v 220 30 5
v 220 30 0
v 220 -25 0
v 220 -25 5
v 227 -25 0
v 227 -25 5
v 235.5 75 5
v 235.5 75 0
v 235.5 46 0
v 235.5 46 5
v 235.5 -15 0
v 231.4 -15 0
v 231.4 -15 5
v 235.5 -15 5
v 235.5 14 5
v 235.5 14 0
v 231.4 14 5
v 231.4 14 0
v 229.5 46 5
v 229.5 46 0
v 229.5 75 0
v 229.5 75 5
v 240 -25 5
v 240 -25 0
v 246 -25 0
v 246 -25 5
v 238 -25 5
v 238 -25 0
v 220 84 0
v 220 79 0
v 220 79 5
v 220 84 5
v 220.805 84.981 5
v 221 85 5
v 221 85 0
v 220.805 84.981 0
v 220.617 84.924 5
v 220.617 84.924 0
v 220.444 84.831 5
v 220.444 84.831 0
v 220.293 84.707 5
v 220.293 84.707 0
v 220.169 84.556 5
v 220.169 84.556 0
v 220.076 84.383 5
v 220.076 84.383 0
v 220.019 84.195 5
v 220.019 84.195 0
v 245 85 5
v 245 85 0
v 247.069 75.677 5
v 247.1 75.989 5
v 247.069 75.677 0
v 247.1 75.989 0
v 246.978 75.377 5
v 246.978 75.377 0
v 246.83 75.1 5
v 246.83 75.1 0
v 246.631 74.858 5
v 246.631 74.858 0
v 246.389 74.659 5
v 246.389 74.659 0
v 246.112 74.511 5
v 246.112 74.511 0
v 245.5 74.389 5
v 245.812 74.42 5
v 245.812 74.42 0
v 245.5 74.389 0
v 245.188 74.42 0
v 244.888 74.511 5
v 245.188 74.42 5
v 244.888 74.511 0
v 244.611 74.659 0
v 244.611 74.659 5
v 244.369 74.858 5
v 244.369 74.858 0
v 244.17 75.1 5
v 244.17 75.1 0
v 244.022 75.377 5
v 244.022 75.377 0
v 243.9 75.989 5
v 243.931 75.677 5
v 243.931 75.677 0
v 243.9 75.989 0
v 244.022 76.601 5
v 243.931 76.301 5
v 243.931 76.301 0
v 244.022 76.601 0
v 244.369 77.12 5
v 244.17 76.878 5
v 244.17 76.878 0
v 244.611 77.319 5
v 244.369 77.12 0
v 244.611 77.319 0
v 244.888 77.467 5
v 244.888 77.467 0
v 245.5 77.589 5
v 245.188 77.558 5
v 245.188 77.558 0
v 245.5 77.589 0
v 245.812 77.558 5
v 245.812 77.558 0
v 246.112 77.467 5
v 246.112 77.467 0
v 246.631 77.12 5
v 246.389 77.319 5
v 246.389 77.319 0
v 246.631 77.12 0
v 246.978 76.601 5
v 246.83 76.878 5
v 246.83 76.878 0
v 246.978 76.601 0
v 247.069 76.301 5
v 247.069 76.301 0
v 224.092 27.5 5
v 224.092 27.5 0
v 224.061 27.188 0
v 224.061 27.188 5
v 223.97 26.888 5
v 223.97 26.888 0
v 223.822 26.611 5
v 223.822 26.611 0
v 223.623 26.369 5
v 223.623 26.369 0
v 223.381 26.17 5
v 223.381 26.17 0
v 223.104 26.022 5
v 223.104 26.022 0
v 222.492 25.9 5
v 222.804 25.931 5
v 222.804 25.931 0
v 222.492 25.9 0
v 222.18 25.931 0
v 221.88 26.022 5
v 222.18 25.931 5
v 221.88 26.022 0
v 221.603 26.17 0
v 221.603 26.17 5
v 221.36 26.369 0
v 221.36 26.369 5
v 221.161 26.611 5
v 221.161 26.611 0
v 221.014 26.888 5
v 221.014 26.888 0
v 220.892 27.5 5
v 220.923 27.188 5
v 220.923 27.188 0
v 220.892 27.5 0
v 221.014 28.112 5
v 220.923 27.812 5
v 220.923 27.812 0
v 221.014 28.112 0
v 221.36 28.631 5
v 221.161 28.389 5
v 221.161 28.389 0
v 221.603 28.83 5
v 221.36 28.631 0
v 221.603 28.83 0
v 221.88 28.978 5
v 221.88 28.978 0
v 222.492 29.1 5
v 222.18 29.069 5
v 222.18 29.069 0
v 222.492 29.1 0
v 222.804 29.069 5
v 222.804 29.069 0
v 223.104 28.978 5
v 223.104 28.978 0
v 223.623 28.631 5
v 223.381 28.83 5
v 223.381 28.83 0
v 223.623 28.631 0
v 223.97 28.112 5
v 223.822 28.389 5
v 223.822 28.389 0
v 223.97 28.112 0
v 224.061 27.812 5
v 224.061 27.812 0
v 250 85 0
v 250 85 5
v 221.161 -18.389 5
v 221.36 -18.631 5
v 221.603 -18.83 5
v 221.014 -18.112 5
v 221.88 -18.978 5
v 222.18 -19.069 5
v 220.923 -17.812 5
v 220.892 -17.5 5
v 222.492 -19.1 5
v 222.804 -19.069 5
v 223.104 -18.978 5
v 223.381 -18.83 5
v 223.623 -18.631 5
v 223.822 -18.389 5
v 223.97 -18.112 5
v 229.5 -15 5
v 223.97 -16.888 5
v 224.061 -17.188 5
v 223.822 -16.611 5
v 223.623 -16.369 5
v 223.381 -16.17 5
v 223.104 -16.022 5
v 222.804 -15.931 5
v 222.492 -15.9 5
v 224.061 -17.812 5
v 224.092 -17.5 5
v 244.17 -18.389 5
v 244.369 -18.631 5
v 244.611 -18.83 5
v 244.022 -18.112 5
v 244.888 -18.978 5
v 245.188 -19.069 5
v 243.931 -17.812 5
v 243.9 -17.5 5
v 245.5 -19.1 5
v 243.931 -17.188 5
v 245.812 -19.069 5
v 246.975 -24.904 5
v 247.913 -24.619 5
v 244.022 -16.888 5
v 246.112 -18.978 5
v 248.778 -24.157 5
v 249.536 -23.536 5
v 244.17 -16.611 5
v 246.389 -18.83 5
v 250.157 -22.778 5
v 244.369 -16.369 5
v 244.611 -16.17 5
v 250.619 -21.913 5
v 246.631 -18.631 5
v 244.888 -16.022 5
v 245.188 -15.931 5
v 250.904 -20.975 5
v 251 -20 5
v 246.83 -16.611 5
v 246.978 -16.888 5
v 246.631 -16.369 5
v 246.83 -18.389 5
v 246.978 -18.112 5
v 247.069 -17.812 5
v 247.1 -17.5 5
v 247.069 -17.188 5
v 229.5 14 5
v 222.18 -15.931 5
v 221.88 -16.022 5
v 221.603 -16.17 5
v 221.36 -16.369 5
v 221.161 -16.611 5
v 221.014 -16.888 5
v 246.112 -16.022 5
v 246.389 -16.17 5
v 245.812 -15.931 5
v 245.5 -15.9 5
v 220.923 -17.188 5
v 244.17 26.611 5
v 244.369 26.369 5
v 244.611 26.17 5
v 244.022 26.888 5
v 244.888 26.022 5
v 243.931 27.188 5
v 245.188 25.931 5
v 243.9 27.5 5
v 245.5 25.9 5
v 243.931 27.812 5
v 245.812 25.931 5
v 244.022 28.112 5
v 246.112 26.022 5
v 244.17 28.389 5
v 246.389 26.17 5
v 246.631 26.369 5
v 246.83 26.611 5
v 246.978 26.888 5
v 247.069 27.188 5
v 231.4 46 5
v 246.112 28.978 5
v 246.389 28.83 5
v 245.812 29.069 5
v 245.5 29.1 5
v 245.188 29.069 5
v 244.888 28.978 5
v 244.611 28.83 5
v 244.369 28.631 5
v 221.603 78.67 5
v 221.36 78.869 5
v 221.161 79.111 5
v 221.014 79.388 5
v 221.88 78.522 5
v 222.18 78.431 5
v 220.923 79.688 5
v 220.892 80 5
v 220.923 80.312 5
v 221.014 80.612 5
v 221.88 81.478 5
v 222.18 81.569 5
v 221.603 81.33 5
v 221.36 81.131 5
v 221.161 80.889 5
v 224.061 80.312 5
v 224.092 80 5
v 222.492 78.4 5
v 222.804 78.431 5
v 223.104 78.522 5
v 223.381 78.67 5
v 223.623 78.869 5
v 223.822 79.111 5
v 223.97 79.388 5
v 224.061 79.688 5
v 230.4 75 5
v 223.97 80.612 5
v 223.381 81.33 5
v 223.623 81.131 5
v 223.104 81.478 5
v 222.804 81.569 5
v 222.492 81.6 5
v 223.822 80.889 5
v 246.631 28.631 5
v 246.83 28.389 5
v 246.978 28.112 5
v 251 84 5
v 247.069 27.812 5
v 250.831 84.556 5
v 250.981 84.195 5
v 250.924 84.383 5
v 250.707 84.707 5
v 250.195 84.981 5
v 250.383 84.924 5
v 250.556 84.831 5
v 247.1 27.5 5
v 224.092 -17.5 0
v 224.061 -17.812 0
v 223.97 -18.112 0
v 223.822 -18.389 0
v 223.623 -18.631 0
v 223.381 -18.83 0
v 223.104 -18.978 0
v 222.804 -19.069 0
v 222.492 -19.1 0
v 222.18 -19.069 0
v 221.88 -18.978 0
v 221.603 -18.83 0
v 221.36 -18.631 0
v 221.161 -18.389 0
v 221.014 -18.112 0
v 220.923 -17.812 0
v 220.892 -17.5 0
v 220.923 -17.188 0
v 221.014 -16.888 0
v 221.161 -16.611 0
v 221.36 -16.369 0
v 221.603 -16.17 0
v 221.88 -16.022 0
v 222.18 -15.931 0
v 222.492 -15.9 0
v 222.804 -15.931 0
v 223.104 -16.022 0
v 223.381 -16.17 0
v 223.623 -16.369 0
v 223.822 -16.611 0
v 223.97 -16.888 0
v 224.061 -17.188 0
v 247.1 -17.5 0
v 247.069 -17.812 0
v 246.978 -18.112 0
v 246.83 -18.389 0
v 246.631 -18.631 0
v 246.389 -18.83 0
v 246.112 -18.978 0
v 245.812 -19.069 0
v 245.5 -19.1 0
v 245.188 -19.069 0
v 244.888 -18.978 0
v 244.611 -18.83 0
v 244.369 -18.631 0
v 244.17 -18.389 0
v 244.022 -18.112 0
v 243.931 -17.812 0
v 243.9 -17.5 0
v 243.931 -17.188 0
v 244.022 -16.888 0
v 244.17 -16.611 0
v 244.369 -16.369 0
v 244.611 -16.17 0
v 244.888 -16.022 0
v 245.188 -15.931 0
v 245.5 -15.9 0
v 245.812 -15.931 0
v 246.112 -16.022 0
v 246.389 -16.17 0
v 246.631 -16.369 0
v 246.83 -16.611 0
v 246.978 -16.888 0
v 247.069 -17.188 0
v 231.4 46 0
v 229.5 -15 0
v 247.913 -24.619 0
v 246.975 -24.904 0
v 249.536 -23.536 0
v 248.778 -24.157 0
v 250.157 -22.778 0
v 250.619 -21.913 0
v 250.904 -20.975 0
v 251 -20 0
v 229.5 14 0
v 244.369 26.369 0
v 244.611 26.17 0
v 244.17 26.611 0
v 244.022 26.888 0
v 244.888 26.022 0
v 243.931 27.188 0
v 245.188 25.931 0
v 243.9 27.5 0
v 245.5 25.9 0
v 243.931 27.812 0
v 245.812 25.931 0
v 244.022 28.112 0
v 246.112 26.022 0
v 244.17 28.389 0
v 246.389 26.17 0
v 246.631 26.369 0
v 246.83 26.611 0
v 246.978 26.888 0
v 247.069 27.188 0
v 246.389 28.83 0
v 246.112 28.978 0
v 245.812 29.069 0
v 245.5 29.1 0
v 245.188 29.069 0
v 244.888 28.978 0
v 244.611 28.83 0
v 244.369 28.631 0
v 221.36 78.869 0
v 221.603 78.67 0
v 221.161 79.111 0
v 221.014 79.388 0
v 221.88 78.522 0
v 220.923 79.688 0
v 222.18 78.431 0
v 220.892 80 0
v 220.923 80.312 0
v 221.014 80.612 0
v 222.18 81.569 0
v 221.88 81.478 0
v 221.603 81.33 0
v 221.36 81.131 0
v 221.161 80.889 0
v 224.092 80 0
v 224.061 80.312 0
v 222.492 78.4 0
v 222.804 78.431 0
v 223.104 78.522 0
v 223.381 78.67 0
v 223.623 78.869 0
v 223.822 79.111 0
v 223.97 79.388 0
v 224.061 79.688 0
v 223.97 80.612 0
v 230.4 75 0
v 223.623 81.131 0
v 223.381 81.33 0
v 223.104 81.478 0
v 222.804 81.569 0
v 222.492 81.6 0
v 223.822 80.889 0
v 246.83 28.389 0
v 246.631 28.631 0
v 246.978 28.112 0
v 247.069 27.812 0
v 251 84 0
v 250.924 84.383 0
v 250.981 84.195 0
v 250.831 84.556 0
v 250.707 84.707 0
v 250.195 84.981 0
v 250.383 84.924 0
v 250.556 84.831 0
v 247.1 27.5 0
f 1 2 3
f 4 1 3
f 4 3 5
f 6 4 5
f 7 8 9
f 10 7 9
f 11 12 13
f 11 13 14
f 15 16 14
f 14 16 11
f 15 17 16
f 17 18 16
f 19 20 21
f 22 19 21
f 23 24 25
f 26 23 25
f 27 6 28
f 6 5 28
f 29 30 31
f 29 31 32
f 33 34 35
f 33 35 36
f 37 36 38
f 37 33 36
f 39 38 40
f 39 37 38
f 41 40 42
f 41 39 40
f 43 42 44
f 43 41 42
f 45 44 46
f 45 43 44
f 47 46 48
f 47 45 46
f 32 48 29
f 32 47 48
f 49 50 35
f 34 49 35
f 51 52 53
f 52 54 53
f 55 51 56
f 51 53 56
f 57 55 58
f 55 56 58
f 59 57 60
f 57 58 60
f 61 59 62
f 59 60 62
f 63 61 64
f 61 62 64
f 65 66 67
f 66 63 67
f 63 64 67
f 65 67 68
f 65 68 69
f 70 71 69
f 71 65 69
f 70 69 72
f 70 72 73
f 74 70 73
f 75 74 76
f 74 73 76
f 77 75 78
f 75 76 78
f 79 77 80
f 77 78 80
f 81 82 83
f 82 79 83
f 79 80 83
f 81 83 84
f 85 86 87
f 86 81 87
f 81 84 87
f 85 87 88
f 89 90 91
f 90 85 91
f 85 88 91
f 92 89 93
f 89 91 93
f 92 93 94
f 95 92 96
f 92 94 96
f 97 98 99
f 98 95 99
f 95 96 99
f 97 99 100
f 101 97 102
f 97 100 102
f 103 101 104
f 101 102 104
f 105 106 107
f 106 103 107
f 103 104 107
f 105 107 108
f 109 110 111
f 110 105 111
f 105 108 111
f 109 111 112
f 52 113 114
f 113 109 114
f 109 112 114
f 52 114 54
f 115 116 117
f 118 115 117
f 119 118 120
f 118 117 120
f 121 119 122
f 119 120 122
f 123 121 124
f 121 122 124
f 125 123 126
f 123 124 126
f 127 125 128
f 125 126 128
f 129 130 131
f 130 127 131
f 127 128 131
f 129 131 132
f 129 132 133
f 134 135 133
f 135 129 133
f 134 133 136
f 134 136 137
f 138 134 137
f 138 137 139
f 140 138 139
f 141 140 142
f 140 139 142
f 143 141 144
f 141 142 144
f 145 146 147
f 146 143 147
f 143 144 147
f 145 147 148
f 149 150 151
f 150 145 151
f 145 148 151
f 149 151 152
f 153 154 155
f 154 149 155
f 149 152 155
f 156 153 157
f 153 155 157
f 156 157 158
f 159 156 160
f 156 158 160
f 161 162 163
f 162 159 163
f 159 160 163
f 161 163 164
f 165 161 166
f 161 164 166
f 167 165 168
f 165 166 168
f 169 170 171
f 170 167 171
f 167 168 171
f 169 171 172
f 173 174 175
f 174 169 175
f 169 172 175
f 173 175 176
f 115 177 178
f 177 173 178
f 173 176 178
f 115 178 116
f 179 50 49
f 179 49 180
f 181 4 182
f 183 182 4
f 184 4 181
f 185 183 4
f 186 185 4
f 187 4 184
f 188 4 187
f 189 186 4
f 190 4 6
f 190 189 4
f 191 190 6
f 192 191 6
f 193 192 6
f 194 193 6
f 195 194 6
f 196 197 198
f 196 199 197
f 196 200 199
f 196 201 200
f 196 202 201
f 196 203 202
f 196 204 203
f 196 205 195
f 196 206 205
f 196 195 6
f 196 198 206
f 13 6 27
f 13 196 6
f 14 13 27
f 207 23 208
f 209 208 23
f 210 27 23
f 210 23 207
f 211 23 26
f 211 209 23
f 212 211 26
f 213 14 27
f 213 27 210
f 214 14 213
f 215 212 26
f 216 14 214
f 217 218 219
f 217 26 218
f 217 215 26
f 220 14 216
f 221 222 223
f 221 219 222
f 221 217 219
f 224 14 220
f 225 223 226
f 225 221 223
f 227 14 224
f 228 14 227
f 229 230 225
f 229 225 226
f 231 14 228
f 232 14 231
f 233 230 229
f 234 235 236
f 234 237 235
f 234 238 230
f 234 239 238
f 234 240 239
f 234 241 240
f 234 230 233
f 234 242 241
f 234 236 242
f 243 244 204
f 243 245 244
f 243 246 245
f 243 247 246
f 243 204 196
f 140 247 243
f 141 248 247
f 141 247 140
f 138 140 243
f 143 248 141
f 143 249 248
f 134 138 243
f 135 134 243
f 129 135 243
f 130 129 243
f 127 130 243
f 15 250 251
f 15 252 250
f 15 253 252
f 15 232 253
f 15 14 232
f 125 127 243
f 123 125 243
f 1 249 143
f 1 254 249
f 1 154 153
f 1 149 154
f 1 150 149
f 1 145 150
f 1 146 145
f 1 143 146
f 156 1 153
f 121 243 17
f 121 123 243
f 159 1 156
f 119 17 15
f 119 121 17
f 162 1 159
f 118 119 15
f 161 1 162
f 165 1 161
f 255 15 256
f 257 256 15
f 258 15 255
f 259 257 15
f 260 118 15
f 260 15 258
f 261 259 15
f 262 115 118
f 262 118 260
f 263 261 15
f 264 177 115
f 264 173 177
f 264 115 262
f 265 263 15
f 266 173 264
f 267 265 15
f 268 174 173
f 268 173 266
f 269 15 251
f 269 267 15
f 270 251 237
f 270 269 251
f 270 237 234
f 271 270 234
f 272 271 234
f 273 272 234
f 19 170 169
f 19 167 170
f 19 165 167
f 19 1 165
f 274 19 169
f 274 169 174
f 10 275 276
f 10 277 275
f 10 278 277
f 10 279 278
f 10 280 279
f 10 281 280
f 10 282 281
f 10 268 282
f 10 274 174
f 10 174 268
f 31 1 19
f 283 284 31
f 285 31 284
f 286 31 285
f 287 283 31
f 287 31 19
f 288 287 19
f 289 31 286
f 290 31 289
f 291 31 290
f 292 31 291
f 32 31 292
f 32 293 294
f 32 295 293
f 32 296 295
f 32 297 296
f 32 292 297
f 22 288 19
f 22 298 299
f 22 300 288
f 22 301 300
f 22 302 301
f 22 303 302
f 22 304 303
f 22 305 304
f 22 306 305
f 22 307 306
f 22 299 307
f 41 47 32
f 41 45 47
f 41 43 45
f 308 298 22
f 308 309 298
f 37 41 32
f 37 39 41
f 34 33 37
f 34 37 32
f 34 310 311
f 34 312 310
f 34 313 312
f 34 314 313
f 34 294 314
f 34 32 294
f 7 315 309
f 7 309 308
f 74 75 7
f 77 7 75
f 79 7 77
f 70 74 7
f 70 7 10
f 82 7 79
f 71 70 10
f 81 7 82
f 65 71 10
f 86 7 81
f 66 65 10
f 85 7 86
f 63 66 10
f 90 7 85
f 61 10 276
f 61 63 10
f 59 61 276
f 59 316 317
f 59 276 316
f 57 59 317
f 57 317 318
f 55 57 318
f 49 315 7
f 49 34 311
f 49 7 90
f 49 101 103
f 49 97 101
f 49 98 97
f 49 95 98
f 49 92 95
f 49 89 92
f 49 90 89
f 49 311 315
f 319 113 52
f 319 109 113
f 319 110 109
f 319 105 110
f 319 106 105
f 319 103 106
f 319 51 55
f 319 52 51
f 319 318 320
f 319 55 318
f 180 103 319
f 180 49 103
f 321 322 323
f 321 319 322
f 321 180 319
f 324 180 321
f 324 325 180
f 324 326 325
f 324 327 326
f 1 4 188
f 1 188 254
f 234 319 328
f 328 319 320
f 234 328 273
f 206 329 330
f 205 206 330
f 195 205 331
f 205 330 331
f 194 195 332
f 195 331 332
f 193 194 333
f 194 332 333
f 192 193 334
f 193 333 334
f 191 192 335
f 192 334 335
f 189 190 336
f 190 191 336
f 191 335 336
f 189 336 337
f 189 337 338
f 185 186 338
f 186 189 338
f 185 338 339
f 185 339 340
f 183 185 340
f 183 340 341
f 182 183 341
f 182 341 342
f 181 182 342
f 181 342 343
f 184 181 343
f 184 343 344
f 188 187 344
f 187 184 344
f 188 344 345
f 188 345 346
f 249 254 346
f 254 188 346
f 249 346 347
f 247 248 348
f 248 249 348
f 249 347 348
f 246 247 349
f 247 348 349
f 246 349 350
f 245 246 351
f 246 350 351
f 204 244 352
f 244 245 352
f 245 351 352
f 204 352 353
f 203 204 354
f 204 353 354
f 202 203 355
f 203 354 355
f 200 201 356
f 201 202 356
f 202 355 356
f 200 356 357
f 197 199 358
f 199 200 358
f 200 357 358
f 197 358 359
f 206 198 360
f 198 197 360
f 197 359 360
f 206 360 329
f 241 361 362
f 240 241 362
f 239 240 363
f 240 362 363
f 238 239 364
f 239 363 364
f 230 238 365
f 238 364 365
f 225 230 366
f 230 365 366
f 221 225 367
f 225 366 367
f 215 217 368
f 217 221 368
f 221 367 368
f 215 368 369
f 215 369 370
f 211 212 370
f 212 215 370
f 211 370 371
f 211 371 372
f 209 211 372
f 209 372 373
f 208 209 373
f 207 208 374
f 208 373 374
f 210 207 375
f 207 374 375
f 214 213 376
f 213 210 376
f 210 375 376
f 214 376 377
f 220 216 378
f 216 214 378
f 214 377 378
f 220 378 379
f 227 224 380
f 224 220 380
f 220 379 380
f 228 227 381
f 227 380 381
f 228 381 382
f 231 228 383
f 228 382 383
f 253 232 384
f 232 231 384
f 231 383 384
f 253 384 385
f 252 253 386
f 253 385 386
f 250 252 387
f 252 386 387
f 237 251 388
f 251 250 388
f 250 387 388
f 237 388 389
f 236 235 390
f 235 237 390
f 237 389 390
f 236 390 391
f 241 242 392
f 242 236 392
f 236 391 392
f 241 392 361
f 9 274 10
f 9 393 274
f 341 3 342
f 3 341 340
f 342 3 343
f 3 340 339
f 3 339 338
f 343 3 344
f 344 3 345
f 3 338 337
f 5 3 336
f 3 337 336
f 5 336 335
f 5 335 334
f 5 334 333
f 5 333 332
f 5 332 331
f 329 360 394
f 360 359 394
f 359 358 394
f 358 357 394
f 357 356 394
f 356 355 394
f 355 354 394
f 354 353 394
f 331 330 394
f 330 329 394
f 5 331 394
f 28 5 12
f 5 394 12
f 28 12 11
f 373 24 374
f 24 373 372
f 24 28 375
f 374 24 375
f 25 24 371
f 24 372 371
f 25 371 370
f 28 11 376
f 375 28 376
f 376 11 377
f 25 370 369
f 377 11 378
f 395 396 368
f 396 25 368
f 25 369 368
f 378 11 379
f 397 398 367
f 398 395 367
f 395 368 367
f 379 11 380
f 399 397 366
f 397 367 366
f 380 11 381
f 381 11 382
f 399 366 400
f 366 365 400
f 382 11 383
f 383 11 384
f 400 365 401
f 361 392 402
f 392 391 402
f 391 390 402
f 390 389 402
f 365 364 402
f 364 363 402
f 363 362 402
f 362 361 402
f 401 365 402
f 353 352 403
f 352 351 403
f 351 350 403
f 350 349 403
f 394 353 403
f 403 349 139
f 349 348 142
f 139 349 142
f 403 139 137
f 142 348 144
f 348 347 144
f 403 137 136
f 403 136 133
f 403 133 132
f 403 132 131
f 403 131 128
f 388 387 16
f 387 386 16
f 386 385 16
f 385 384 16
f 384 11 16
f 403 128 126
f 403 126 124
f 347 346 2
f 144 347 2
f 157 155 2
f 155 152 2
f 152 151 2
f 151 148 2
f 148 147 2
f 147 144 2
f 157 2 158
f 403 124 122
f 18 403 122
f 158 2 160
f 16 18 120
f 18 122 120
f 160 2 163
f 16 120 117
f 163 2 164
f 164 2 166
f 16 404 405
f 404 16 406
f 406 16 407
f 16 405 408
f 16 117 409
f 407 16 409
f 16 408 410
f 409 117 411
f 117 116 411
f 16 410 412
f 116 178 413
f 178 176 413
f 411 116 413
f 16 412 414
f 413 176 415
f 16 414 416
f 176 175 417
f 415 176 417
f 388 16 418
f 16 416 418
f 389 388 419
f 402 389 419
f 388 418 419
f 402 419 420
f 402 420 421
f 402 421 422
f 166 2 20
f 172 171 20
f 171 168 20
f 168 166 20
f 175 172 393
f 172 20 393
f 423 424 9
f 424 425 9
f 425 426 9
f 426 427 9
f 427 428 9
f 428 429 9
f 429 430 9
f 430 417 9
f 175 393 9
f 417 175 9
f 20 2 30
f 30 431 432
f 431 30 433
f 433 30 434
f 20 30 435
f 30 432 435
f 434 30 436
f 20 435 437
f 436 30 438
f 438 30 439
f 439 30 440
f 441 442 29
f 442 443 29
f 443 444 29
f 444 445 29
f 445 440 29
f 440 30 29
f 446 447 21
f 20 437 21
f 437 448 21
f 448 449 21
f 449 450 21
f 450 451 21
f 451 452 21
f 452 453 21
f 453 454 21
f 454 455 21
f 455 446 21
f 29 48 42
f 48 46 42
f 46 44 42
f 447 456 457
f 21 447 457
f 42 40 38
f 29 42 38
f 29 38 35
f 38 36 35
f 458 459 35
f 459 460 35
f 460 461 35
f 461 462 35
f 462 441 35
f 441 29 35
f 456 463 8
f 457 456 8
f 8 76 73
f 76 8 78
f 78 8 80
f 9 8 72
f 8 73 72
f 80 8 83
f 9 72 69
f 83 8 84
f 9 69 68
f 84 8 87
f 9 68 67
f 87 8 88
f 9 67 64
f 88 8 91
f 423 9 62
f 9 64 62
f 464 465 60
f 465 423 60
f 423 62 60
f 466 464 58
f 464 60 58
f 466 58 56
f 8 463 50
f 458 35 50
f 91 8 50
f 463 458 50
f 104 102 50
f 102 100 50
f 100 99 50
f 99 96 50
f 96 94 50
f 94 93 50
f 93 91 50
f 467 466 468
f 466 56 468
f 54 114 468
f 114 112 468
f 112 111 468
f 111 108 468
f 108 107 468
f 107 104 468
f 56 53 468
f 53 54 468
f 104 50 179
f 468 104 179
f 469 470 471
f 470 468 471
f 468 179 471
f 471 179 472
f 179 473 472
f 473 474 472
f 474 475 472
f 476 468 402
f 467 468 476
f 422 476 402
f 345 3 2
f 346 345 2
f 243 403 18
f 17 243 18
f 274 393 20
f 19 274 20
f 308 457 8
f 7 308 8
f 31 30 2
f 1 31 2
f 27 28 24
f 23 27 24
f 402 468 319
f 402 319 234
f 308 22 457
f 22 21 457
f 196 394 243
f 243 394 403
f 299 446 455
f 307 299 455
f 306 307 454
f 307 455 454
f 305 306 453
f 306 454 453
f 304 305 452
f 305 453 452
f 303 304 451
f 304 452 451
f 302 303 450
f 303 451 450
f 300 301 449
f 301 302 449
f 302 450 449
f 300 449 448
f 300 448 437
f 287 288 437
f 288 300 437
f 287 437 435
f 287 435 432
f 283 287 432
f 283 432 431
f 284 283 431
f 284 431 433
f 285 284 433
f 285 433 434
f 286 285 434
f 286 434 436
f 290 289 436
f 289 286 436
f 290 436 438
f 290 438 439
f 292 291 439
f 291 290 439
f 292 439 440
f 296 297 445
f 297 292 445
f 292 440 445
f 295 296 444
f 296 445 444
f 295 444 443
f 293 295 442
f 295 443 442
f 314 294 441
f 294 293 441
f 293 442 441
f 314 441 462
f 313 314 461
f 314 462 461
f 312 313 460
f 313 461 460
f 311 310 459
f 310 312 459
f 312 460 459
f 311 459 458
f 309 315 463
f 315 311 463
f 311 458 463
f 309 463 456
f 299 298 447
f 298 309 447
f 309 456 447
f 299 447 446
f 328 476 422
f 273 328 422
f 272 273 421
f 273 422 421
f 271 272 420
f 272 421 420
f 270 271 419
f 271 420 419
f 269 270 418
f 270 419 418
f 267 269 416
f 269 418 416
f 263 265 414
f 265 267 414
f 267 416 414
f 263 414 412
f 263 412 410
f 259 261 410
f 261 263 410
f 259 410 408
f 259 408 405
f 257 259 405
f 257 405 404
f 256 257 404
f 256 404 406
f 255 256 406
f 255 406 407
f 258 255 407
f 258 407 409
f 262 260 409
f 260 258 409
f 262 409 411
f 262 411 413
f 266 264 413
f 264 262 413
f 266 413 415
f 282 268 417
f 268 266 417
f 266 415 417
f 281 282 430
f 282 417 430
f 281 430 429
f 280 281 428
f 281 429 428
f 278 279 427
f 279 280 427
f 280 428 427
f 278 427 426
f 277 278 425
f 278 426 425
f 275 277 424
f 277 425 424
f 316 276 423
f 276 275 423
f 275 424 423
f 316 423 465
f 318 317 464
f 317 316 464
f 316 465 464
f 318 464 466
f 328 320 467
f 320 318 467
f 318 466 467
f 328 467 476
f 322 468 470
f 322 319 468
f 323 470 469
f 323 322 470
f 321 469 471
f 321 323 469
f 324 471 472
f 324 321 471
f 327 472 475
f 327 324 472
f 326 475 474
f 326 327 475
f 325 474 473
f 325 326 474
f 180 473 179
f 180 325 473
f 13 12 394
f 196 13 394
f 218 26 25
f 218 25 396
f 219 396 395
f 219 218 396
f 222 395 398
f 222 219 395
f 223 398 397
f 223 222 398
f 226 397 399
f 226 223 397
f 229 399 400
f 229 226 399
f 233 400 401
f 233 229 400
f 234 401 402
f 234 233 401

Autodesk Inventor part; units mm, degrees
ref_plane "YZ Plane" through (0, 0, 0) normal (1, 0, 0) x (0, 1, 0)
ref_plane "XZ Plane" through (0, 0, 0) normal (0, 1, 0) x (-1, 0, 0)
ref_plane "XY Plane" through (0, 0, 0) normal (0, 0, 1) x (1, 0, 0)
sketch "Boceto1" plane through (0, 0, 0) normal (0, 0, 1) x (1, 0, 0)
  line L0 (220, 79) -> (220, 30)
  line L1 (229.5, 46) -> (229.5, 75)
  line L2 (235.5, 75) -> (235.5, 46)
  line L3 (229.5, -15) -> (229.5, 14)
  line L4 (235.5, 14) -> (235.5, -15)
  circle A0 centre (222.4918, -17.5) radius 1.6
  circle A1 centre (222.4918, 27.5) radius 1.6
  circle A2 centre (245.5, 27.5) radius 1.6
  circle A3 centre (245.5, -17.5) radius 1.6
  circle A4 centre (222.4918, 80) radius 1.6
  circle A5 centre (245.5, 75.9891) radius 1.6
  line L5 (220, 30) -> (220, -25)
  line L6 (229.5, 75) -> (230.4, 75)
  line L7 (231.4, 46) -> (229.5, 46)
  line L8 (220, -25) -> (227, -25)
  line L9 (238, -25) -> (240, -25)
  line L10 (231.4, -15) -> (229.5, -15)
  line L11 (229.5, 14) -> (231.4, 14)
  line L12 (230.4, 75) -> (235.5, 75)
  line L13 (231.4, 46) -> (235.5, 46)
  line L14 (231.4, 14) -> (235.5, 14)
  line L15 (231.4, -15) -> (235.5, -15)
  line L16 (227, -25) -> (238, -25)
  line L17 (245, 85) -> (220, 85)
  line L18 (220, 79) -> (220, 85)
  line L19 (251, 85) -> (251, -25)
  line L20 (240, -25) -> (251, -25)
  line L21 (245, 85) -> (251, 85)
  point P0 (0, 0)
  point P1 (245, -15)
  point P2 (245, 75)
  dimension "d2" = 6
  dimension "d3" = 9.5
  dimension "d4" = 6
  dimension "d5" = 9.5
  dimension "d6" = 29
  dimension "d9" = 9.0109
  dimension "d10" = 5
  dimension "d11" = 10
  dimension "d14" = 25.5
  dimension "d15" = 25.5
  dimension "d16" = 25.5
extrude "Extrusión1" add sketch "Boceto1" along normal blind 5
fillet "Empalme1" radius 1 2 edges at (251, 85, 2.5) (220, 85, 2.5)
fillet "Empalme2" radius 5 1 edges at (251, -25, 2.5)
properties part number "suplemento cojinete tapa"
